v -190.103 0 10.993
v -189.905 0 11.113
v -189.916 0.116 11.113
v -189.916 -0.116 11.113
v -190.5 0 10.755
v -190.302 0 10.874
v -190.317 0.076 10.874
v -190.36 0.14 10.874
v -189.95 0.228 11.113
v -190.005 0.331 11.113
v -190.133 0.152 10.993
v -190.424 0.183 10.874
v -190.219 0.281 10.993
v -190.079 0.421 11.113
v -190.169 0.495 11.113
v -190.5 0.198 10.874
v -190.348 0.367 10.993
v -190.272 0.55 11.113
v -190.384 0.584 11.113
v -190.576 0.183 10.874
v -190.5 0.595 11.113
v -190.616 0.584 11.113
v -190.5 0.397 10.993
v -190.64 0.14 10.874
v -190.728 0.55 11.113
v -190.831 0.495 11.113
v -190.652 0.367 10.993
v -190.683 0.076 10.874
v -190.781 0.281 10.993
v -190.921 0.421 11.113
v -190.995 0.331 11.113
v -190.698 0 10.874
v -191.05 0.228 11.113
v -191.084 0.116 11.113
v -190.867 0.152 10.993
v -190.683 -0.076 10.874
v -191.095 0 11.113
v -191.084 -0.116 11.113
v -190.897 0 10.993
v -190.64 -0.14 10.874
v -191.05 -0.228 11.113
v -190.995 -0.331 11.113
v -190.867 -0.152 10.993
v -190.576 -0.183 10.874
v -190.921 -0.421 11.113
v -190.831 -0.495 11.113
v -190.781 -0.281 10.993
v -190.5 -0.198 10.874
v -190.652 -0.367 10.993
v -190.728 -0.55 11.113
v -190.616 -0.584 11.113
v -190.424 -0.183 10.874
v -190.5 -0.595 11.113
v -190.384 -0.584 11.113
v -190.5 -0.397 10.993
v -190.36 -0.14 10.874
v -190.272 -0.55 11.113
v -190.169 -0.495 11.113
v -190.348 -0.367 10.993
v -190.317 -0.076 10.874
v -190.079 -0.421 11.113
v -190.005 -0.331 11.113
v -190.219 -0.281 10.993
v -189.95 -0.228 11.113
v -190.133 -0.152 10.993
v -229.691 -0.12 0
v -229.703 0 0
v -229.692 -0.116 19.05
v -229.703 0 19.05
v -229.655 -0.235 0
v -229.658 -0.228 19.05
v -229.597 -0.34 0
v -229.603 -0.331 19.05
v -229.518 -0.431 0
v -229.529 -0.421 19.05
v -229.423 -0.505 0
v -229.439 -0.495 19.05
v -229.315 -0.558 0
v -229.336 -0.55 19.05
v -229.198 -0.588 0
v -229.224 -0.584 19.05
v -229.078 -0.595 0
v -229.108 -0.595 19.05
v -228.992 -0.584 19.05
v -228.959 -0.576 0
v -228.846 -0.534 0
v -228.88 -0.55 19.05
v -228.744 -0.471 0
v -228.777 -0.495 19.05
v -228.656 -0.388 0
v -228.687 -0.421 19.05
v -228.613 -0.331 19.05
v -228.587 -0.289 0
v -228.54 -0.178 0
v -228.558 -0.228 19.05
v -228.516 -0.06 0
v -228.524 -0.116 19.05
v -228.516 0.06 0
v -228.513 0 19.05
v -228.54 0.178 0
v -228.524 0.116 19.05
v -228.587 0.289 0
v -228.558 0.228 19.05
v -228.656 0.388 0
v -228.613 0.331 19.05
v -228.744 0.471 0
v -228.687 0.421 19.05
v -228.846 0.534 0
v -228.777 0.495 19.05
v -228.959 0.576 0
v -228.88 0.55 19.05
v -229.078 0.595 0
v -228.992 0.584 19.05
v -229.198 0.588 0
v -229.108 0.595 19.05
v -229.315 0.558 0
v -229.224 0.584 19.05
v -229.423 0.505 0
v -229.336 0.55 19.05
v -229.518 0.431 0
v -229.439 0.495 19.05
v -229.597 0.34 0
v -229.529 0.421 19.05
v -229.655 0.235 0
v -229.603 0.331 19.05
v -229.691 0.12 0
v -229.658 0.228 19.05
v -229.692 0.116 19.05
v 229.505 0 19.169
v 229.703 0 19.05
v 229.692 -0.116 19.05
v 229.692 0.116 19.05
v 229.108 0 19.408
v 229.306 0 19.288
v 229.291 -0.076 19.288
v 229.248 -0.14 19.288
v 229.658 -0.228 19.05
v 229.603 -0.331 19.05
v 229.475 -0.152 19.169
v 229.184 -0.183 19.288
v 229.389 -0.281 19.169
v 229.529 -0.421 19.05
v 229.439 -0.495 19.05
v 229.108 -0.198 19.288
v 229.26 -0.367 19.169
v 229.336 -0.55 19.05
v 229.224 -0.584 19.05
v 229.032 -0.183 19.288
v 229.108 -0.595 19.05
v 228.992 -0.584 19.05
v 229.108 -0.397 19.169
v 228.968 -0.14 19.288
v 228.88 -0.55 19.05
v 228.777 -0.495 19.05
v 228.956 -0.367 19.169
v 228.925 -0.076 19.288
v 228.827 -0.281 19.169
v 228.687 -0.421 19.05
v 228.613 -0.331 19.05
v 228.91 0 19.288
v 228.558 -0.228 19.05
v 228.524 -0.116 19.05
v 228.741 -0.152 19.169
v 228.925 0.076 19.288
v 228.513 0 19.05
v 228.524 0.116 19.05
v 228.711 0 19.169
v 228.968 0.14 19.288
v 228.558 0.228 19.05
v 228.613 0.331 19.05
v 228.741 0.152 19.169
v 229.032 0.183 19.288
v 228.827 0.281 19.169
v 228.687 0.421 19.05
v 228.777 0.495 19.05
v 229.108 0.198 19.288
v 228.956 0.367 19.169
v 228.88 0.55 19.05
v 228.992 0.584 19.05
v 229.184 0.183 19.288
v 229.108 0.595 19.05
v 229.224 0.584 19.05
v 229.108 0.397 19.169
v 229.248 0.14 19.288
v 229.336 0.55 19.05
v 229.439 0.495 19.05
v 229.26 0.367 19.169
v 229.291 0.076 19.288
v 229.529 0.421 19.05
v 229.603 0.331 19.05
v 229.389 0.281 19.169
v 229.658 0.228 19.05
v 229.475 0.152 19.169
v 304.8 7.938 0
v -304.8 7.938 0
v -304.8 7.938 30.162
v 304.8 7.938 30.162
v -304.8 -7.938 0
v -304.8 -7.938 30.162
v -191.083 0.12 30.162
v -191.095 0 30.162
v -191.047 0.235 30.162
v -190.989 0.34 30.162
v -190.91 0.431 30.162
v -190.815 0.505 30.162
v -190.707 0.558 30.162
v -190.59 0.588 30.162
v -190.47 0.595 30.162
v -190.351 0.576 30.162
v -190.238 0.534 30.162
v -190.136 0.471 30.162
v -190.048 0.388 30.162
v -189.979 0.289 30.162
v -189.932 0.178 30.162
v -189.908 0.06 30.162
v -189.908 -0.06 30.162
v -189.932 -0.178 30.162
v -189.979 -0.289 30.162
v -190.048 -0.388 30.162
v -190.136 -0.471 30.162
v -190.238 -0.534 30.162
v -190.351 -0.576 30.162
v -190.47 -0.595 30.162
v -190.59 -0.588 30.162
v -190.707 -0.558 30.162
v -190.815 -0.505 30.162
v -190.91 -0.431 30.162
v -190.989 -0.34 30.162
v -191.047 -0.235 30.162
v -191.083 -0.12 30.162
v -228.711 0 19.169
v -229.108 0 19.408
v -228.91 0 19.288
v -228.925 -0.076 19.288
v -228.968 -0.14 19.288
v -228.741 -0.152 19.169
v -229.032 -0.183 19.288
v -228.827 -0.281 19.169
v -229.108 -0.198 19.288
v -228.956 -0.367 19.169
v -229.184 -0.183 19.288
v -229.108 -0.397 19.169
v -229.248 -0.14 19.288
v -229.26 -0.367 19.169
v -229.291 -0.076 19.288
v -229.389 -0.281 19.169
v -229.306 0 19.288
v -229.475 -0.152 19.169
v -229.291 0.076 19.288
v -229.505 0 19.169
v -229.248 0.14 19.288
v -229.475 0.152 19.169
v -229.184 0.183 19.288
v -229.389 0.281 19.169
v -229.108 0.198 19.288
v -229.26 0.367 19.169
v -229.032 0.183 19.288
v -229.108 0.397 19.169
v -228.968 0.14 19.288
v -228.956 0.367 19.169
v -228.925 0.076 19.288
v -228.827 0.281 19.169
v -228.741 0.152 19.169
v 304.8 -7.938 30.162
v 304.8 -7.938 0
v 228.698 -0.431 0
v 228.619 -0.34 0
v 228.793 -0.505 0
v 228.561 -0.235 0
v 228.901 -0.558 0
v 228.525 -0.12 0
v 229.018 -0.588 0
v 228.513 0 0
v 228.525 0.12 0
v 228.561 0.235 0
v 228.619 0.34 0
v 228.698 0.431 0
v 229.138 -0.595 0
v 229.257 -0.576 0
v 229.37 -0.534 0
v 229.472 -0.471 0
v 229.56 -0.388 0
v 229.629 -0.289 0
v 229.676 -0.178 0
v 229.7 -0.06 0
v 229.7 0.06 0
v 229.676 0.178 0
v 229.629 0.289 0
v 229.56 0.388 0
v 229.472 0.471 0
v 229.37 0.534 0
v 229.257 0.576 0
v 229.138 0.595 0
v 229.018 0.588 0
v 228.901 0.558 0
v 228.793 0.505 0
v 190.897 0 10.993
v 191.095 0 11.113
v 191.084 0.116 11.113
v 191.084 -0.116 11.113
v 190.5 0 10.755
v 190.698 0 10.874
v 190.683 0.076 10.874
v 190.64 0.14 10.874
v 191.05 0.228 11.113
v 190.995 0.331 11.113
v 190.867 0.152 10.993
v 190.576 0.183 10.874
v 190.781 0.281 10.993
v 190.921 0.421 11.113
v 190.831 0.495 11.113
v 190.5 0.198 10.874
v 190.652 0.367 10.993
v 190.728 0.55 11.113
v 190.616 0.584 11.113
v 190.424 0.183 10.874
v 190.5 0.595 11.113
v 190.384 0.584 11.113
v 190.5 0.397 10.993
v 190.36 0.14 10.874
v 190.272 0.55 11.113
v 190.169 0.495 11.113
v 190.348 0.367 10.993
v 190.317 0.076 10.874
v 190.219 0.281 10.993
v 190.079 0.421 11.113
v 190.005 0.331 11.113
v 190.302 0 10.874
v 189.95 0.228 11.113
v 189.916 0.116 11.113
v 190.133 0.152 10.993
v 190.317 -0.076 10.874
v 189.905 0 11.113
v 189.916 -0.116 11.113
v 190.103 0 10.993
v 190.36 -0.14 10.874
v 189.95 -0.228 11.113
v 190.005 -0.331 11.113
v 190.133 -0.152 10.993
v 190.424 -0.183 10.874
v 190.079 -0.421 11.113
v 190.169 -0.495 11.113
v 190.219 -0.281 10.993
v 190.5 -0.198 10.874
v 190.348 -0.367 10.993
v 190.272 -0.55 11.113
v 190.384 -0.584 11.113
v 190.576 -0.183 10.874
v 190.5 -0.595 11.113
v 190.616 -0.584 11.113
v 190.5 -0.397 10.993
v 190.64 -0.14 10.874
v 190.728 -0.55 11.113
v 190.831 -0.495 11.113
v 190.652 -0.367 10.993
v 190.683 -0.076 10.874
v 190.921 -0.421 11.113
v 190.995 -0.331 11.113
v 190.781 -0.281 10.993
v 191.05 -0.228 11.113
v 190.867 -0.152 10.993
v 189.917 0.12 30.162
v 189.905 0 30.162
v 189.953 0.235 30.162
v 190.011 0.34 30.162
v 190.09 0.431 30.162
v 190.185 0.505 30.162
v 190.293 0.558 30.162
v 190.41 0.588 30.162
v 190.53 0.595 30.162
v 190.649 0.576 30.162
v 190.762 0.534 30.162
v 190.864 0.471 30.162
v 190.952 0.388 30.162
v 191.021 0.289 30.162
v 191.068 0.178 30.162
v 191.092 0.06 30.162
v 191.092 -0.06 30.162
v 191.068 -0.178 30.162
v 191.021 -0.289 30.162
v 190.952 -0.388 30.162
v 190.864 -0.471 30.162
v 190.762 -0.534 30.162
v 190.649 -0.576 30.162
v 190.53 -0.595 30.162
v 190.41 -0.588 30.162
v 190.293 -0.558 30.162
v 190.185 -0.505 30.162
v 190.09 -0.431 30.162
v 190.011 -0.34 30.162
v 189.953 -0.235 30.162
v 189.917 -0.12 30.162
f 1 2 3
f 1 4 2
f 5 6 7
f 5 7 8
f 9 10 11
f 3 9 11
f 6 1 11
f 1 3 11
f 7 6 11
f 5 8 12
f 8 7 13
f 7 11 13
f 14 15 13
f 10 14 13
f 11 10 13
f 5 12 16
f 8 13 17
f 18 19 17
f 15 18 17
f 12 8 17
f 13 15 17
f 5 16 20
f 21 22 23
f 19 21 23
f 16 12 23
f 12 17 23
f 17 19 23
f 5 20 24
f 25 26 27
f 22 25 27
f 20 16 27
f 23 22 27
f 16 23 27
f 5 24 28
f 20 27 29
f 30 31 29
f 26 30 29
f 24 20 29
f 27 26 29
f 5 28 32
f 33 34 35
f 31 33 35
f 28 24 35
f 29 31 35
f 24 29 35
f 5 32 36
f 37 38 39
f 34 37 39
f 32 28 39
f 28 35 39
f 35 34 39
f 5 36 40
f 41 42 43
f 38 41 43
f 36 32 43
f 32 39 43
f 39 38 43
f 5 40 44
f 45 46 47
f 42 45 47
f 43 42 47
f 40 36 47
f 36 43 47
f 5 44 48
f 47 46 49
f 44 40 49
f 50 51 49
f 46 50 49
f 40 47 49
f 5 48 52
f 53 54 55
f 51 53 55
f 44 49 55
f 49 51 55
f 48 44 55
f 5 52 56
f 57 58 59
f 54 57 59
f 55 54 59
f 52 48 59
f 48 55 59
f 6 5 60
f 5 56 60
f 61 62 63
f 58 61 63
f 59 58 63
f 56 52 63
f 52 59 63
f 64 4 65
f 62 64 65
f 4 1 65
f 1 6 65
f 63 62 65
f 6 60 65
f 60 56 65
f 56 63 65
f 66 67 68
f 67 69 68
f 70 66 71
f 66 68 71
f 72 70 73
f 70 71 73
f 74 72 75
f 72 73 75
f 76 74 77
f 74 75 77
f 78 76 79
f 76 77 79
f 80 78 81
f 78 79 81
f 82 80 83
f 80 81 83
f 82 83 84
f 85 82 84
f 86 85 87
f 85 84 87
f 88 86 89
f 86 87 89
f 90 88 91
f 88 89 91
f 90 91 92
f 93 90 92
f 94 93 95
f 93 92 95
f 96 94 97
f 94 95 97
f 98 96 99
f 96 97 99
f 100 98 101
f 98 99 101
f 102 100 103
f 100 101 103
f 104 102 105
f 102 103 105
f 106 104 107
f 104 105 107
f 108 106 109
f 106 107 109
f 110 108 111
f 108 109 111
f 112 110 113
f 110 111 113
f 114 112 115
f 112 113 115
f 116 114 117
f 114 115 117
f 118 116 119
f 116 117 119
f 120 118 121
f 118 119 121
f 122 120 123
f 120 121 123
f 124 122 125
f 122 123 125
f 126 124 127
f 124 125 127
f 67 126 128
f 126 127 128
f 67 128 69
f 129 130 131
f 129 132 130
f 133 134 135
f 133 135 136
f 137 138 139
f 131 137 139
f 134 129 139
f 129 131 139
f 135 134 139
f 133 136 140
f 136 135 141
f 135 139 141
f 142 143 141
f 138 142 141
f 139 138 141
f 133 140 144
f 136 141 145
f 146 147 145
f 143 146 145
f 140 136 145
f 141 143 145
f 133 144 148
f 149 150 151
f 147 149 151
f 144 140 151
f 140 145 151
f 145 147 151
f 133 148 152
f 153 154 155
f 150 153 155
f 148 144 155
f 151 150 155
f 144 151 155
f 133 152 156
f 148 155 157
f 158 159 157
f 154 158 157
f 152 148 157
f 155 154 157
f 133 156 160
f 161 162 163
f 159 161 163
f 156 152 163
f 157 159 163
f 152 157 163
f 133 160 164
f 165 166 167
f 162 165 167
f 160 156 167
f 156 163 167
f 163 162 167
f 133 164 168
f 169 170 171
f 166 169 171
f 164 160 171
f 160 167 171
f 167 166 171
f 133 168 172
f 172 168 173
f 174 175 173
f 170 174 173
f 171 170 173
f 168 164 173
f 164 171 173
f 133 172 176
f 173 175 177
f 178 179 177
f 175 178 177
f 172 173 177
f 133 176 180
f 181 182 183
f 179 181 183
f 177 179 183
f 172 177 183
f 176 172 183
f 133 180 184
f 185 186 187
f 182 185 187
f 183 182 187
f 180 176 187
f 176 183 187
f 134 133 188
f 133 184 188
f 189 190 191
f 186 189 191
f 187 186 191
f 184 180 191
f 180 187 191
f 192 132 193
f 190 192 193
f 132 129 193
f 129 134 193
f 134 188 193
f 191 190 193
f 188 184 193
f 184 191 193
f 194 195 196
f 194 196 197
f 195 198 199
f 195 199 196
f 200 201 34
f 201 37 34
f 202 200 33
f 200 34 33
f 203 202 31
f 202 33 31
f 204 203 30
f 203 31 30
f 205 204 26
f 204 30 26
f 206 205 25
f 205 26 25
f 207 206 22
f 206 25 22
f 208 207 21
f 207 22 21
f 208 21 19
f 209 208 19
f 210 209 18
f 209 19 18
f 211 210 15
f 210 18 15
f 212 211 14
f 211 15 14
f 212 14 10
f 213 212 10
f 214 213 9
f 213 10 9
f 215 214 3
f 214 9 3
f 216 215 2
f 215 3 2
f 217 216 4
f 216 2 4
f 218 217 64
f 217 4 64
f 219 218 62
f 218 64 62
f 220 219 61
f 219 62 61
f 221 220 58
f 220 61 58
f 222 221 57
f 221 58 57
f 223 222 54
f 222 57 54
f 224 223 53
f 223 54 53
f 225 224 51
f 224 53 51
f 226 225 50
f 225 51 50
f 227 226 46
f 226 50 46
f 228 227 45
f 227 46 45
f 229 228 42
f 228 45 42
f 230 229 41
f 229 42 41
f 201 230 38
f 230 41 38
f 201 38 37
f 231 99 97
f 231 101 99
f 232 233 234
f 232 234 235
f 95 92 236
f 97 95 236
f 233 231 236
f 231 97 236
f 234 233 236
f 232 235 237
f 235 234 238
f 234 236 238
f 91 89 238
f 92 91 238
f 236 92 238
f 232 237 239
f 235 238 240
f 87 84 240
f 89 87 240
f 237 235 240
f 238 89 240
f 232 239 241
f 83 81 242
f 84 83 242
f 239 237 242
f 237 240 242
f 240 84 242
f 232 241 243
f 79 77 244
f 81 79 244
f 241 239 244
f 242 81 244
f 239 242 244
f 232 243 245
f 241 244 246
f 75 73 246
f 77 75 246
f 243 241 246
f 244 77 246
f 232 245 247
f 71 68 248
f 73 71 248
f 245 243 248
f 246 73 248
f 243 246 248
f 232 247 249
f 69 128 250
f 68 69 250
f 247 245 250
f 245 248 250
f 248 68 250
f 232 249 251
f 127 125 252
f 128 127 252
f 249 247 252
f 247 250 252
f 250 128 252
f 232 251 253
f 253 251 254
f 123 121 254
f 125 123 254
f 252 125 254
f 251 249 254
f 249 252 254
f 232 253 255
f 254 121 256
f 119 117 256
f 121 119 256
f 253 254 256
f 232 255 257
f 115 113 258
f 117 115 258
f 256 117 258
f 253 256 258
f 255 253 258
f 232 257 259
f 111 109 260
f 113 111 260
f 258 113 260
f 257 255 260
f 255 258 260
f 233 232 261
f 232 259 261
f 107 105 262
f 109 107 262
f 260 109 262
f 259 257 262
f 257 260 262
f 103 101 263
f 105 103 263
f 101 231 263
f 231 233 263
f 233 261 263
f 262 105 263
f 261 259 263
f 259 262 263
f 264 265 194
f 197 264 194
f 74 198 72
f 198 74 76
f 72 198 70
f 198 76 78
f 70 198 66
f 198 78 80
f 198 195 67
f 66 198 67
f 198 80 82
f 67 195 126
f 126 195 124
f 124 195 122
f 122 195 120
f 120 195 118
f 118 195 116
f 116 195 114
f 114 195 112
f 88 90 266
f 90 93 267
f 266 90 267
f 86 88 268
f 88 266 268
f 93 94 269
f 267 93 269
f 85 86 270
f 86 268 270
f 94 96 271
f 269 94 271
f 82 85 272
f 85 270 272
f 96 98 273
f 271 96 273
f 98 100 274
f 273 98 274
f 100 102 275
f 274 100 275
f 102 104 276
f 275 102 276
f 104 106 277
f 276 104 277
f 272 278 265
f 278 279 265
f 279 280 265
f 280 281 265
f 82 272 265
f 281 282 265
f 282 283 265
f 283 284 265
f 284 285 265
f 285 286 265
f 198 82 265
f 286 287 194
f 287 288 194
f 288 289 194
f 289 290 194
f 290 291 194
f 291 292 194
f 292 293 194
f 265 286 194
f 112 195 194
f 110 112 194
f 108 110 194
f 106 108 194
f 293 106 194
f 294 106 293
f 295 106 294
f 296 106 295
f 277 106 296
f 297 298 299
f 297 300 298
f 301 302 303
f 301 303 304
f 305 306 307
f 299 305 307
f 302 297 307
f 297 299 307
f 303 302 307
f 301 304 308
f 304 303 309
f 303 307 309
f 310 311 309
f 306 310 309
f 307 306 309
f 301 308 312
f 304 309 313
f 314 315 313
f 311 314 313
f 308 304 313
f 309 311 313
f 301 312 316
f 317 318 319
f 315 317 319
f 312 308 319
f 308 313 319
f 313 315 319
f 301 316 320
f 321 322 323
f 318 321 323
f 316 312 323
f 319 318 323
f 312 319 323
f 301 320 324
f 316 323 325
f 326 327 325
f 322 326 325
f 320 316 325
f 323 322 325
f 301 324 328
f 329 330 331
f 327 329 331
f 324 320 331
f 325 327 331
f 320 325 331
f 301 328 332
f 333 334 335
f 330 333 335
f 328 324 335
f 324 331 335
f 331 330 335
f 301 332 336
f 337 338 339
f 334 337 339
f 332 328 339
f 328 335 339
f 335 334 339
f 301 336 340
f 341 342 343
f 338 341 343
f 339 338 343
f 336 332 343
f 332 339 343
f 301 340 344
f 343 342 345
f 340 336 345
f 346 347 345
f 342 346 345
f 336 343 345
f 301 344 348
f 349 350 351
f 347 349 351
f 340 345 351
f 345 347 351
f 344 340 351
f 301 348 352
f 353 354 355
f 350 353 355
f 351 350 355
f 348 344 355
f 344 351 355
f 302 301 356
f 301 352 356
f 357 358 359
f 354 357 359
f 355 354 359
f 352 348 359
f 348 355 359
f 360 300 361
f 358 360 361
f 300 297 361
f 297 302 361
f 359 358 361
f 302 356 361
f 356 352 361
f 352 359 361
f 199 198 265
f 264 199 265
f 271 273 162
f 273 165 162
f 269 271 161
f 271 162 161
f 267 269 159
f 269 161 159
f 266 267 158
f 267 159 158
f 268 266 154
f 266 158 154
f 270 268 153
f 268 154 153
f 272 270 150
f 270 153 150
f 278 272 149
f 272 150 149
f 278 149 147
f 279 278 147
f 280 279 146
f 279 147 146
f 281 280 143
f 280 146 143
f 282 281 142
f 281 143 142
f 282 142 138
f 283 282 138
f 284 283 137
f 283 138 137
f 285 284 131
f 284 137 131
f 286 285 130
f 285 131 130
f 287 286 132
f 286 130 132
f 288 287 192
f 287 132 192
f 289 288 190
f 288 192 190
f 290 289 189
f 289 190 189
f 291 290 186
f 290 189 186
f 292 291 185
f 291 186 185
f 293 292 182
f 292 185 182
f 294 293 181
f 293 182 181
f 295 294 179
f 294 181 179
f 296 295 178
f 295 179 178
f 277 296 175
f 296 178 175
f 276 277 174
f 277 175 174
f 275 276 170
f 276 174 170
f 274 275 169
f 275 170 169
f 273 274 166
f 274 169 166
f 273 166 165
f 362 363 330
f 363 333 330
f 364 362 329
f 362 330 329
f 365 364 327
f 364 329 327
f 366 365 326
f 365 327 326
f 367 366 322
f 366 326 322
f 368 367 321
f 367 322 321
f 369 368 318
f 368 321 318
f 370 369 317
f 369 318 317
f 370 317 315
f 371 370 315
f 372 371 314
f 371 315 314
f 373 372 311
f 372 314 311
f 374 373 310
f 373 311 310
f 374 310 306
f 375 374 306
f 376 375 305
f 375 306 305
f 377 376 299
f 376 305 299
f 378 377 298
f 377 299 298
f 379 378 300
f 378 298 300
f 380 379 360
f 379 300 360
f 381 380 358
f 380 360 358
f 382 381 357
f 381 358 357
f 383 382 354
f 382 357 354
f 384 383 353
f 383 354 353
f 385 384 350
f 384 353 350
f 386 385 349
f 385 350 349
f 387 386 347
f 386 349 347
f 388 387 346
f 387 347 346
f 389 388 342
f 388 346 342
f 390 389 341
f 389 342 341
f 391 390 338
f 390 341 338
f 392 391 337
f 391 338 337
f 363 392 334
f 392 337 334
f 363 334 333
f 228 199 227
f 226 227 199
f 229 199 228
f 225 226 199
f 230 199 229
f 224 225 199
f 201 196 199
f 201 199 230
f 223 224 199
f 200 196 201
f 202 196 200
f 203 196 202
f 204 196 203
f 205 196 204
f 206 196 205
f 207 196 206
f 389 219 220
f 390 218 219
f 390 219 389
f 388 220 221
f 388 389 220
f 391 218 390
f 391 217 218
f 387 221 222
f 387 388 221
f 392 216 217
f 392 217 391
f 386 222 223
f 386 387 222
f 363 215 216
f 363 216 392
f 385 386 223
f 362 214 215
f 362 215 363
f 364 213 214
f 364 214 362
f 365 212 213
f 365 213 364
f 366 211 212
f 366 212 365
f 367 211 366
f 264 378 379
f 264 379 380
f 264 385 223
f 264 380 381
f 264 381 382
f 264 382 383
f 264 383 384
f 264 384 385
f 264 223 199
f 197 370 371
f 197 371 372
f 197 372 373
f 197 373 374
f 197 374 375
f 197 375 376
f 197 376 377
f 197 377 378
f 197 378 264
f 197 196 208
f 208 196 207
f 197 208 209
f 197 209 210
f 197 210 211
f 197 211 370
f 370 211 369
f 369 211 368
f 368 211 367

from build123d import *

# Parameters (mm, degrees)
F0_W     = 609.6
F0_H     = 15.875
F1_DEPTH = 30.1625
F3_D     = 1.190625
F3_DEPTH = 19.05
F3_TIP   = 0.3576998373
F5_D     = 1.190625
F5_DEPTH = 19.05
F5_TIP   = 0.3576998373


with BuildPart() as f1:
    # F0 (on Top) → F1 (new body)
    with BuildSketch(Plane.XY):
        Rectangle(F0_W, F0_H)
    extrude(amount=F1_DEPTH)

    # F3
    with Locations(Plane(origin=(0, 0, 0), x_dir=(1, 0, 0), z_dir=(0, 0, -1))):
        with Locations((229.108, 0), (-229.108, 0)):
            Hole(F3_D / 2, depth=F3_DEPTH)
            with Locations((0, 0, -(F3_DEPTH + F3_TIP / 2))):  # 118° drill point
                Cone(0, F3_D / 2, F3_TIP, mode=Mode.SUBTRACT)

    # F5
    with Locations(Plane.XY.offset(30.1625)):
        with Locations((190.5, 0), (-190.5, 0)):
            Hole(F5_D / 2, depth=F5_DEPTH)
            with Locations((0, 0, -(F5_DEPTH + F5_TIP / 2))):  # 118° drill point
                Cone(0, F5_D / 2, F5_TIP, mode=Mode.SUBTRACT)


solid = f1.part
